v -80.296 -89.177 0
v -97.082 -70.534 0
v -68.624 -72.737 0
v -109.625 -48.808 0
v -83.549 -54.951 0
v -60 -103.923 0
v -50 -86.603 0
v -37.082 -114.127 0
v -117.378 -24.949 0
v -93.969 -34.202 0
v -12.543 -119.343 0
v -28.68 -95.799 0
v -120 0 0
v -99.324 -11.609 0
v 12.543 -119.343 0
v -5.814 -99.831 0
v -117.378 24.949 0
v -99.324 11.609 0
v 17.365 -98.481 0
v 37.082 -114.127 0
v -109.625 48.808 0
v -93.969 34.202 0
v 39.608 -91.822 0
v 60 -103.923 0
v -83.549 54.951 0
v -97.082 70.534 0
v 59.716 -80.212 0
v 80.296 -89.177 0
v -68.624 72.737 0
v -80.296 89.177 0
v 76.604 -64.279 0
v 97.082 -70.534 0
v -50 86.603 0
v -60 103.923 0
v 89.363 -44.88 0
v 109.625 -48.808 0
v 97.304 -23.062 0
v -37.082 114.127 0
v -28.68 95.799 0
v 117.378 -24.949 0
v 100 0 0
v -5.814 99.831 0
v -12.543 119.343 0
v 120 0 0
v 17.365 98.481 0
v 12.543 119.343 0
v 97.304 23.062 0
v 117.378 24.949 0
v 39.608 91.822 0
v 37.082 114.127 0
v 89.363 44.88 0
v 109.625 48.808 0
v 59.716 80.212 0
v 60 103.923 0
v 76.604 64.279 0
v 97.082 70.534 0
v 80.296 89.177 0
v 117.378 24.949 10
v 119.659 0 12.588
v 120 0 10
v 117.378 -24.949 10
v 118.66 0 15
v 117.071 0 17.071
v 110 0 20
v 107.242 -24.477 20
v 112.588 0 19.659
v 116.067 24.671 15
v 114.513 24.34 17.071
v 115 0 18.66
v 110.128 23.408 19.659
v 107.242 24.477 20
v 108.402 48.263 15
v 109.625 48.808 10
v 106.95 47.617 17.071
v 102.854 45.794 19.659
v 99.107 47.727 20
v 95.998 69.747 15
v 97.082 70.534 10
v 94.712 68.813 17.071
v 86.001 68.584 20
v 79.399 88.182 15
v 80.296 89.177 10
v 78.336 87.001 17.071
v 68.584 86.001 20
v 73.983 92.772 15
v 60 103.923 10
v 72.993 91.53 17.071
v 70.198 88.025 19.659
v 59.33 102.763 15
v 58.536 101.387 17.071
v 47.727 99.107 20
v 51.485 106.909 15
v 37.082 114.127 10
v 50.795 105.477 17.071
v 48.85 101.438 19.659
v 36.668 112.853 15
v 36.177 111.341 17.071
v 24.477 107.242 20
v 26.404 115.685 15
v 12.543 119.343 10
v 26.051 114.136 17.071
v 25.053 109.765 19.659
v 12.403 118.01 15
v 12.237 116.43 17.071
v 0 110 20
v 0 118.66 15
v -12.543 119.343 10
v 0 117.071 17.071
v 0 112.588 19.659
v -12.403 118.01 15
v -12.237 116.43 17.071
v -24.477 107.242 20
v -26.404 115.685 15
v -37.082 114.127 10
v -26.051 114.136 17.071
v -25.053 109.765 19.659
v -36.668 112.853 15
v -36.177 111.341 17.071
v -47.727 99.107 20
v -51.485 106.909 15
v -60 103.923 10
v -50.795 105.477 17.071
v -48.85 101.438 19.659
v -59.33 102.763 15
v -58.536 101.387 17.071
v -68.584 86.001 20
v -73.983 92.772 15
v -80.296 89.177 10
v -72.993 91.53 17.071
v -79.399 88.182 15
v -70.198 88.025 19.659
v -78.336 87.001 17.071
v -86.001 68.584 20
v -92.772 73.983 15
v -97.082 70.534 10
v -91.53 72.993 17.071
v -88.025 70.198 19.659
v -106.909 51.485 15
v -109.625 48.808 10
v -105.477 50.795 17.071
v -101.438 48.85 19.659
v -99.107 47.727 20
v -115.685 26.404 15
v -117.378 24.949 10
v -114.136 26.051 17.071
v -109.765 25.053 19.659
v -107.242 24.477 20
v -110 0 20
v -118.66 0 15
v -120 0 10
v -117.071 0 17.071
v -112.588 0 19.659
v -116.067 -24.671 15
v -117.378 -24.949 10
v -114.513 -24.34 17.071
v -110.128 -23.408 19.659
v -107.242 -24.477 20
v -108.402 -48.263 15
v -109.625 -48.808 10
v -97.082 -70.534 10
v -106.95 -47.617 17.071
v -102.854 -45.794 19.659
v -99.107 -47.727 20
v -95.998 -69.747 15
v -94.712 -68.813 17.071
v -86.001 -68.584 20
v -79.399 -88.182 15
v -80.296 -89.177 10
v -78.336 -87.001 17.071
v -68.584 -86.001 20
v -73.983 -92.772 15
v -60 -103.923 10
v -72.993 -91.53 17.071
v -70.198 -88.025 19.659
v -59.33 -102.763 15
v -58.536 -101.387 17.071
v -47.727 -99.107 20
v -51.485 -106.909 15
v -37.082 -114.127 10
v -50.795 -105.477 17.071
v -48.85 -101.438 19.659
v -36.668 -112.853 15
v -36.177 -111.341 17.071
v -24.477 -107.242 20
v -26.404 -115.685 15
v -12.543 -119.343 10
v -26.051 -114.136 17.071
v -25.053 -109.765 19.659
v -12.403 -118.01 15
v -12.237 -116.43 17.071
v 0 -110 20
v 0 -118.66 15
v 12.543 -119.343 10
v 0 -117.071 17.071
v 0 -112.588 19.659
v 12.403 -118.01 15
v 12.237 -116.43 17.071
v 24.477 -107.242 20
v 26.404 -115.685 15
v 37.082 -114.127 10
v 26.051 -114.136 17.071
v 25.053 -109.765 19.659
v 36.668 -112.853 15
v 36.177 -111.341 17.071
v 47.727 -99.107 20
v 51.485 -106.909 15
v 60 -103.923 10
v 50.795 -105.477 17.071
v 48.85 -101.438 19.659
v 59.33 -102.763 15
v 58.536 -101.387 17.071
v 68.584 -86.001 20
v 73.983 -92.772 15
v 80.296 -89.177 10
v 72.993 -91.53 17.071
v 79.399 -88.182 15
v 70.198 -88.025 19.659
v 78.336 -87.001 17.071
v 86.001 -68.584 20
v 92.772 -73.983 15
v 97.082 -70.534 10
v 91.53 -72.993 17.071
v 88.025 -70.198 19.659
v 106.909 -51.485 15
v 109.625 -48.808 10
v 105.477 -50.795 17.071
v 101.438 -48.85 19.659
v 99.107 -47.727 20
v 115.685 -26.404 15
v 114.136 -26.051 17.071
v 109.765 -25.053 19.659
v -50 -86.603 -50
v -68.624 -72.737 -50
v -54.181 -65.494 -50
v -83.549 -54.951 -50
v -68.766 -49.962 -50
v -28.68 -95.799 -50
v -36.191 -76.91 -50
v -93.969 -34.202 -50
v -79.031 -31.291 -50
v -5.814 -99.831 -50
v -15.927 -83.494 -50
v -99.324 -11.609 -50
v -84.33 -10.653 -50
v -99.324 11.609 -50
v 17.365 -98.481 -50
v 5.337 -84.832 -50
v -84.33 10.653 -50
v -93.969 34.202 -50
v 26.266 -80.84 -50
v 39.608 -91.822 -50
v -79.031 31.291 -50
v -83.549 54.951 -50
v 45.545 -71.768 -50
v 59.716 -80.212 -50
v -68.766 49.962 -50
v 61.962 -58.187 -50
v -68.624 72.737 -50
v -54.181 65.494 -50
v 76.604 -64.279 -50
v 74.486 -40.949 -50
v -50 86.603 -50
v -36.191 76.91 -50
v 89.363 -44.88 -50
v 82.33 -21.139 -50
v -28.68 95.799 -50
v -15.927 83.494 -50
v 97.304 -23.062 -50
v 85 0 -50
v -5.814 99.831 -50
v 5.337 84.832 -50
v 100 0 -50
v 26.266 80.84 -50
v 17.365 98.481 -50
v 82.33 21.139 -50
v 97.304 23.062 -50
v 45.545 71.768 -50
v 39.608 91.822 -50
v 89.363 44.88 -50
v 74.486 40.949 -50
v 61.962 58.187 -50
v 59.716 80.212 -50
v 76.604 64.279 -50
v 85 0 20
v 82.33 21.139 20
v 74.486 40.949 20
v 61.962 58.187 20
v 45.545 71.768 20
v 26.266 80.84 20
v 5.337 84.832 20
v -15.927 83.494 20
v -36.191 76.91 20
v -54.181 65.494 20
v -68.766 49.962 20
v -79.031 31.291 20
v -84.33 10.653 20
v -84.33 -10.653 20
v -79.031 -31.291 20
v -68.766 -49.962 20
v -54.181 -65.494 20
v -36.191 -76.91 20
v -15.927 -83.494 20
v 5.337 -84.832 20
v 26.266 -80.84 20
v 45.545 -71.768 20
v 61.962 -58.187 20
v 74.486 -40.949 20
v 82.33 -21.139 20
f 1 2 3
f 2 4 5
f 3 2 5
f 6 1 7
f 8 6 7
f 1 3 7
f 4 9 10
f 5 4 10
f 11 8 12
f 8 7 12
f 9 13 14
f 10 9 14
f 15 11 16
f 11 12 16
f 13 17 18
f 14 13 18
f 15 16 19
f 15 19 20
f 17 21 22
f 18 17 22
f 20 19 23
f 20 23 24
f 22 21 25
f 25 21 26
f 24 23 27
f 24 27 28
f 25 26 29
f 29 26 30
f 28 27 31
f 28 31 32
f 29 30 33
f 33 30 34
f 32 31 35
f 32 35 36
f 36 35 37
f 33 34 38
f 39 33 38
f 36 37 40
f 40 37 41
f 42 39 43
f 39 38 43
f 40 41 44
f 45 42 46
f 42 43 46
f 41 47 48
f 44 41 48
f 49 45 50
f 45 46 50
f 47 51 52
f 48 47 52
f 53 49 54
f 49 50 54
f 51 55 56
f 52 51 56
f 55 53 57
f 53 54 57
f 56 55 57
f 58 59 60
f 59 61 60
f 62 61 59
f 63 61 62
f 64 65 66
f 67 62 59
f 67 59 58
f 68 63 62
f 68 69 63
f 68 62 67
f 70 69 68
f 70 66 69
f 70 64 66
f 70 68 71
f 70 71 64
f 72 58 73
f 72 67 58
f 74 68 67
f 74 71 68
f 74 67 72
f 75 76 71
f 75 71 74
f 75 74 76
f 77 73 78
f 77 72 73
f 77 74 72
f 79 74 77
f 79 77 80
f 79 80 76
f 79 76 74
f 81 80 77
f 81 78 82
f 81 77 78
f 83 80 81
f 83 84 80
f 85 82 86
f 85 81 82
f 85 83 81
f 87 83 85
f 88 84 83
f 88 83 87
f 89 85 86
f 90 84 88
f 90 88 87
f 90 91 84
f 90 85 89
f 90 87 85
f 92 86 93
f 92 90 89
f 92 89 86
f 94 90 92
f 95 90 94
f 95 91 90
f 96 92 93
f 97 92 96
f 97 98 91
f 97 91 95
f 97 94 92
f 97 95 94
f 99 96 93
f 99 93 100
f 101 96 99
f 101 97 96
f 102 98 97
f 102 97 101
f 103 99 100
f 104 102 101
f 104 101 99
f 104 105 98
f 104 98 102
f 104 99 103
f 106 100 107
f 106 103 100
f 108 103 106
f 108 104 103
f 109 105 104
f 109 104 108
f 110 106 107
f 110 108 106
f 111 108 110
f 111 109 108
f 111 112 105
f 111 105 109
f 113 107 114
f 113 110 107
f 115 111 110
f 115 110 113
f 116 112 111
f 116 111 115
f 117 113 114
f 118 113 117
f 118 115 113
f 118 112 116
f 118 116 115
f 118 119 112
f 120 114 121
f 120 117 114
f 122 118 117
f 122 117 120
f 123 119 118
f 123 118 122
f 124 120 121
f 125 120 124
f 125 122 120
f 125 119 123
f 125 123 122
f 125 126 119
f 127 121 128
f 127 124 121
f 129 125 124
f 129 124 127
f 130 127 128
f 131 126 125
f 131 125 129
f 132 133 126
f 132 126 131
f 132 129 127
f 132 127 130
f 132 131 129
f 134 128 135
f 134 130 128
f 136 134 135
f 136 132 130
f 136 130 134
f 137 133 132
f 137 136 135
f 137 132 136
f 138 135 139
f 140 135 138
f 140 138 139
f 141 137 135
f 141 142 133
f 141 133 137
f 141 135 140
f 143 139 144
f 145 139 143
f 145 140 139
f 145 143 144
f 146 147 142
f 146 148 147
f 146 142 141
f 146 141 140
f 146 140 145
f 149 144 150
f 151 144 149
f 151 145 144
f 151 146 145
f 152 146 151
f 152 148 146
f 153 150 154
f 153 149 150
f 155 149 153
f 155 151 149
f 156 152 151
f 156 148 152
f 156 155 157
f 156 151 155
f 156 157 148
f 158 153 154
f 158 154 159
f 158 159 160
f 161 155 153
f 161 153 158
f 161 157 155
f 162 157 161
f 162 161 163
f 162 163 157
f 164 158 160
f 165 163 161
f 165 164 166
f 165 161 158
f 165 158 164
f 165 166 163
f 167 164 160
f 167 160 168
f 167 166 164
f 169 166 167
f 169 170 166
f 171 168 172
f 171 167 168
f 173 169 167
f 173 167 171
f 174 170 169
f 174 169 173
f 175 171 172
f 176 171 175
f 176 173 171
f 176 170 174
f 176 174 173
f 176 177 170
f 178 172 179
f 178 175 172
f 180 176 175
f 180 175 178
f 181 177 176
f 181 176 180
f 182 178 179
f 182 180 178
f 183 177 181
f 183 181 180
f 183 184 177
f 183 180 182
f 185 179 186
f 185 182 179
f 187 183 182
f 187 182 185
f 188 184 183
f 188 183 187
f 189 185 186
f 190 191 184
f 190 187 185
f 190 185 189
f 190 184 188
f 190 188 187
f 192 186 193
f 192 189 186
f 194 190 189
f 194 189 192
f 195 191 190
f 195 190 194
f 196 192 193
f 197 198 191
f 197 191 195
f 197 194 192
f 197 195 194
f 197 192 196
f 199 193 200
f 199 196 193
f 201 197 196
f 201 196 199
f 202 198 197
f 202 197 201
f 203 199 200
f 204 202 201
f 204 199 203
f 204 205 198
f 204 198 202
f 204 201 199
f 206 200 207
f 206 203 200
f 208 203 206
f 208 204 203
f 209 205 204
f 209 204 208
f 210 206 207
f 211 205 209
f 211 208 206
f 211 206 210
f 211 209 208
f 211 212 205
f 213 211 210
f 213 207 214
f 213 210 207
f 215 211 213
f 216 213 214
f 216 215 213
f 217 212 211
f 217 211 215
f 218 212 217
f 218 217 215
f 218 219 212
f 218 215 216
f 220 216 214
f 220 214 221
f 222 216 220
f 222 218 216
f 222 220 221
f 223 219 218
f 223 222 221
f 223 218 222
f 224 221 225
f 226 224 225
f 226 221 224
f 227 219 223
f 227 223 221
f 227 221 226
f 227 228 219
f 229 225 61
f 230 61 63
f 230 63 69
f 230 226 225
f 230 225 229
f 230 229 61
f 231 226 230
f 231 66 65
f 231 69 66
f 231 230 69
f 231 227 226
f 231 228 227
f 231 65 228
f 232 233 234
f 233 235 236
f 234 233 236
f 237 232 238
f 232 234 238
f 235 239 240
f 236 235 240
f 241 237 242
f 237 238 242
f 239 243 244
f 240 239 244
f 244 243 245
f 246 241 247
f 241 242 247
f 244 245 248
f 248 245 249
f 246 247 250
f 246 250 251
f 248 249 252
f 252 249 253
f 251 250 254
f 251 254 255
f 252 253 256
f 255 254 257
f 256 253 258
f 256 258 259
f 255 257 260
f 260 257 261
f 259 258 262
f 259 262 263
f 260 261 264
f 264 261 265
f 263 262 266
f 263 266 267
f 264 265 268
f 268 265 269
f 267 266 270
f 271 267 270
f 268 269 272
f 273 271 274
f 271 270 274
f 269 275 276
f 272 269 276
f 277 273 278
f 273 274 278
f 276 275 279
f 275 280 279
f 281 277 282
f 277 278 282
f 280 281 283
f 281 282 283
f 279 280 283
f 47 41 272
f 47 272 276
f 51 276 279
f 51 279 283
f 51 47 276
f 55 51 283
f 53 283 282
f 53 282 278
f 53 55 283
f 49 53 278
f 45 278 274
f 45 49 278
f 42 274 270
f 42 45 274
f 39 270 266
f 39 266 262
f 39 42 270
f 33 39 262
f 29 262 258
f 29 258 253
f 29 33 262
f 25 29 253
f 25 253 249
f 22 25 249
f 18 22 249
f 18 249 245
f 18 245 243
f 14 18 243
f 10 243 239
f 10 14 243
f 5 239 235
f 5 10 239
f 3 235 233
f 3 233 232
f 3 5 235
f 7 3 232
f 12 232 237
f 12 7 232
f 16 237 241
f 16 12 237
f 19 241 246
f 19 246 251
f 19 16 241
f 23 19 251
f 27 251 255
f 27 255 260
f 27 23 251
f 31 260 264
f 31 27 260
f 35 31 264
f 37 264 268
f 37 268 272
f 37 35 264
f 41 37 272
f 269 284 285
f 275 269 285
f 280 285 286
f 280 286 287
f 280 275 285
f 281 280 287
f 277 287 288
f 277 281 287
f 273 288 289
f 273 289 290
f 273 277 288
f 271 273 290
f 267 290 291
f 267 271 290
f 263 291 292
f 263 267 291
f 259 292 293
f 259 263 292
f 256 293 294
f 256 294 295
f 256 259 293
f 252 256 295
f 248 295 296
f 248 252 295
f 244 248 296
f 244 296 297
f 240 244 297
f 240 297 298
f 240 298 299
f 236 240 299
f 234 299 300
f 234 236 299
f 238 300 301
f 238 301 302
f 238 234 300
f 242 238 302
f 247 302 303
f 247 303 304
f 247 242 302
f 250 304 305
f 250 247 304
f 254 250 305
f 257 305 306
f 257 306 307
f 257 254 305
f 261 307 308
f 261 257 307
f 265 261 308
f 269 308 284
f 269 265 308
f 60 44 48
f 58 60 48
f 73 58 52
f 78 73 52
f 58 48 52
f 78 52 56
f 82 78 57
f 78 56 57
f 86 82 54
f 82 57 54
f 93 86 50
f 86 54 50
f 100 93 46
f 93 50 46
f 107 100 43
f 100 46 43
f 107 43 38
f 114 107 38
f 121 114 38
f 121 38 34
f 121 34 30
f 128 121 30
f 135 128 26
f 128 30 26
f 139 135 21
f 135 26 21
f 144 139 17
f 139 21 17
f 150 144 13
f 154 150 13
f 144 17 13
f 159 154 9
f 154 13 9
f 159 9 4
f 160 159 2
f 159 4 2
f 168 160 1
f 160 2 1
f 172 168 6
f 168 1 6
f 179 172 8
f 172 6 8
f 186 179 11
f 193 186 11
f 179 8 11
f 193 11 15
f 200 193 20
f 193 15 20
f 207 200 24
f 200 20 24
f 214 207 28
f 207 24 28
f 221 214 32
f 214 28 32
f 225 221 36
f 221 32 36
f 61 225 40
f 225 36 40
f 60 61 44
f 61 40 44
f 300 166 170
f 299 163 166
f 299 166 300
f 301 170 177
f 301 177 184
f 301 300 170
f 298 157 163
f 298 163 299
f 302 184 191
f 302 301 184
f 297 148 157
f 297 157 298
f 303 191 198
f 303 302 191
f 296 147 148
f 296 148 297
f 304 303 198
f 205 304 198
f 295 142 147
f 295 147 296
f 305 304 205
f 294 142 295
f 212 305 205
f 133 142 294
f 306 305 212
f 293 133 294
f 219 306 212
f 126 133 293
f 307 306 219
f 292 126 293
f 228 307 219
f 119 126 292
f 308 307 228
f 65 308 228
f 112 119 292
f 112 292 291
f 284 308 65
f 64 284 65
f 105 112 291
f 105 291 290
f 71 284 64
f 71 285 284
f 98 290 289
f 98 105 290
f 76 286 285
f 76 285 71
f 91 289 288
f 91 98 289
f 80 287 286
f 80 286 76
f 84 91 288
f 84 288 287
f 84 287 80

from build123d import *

# Parameters (mm, degrees)
F0_R     = 100
F0_R_2   = 85
F1_DEPTH = 50
F0_R_3   = 120
F2_DEPTH = 20
F3_R     = 10


with BuildPart() as f1:
    # F0 (on Top) → F1 (new body)
    with BuildSketch(Plane.XY):
        Circle(F0_R)
        Circle(F0_R_2, mode=Mode.SUBTRACT)
    extrude(amount=-F1_DEPTH)

    # F0 (on Top) → F2 (join)
    with BuildSketch(Plane.XY):
        Circle(F0_R_3)
        Circle(F0_R, mode=Mode.SUBTRACT)
        Circle(F0_R)
        Circle(F0_R_2, mode=Mode.SUBTRACT)
    extrude(amount=F2_DEPTH)

    # F3
    f3_edges = [f1.edges().sort_by_distance(p)[0] for p in [
        (-120, 0, 20),
    ]]
    fillet(f3_edges, radius=F3_R)


solid = f1.part
